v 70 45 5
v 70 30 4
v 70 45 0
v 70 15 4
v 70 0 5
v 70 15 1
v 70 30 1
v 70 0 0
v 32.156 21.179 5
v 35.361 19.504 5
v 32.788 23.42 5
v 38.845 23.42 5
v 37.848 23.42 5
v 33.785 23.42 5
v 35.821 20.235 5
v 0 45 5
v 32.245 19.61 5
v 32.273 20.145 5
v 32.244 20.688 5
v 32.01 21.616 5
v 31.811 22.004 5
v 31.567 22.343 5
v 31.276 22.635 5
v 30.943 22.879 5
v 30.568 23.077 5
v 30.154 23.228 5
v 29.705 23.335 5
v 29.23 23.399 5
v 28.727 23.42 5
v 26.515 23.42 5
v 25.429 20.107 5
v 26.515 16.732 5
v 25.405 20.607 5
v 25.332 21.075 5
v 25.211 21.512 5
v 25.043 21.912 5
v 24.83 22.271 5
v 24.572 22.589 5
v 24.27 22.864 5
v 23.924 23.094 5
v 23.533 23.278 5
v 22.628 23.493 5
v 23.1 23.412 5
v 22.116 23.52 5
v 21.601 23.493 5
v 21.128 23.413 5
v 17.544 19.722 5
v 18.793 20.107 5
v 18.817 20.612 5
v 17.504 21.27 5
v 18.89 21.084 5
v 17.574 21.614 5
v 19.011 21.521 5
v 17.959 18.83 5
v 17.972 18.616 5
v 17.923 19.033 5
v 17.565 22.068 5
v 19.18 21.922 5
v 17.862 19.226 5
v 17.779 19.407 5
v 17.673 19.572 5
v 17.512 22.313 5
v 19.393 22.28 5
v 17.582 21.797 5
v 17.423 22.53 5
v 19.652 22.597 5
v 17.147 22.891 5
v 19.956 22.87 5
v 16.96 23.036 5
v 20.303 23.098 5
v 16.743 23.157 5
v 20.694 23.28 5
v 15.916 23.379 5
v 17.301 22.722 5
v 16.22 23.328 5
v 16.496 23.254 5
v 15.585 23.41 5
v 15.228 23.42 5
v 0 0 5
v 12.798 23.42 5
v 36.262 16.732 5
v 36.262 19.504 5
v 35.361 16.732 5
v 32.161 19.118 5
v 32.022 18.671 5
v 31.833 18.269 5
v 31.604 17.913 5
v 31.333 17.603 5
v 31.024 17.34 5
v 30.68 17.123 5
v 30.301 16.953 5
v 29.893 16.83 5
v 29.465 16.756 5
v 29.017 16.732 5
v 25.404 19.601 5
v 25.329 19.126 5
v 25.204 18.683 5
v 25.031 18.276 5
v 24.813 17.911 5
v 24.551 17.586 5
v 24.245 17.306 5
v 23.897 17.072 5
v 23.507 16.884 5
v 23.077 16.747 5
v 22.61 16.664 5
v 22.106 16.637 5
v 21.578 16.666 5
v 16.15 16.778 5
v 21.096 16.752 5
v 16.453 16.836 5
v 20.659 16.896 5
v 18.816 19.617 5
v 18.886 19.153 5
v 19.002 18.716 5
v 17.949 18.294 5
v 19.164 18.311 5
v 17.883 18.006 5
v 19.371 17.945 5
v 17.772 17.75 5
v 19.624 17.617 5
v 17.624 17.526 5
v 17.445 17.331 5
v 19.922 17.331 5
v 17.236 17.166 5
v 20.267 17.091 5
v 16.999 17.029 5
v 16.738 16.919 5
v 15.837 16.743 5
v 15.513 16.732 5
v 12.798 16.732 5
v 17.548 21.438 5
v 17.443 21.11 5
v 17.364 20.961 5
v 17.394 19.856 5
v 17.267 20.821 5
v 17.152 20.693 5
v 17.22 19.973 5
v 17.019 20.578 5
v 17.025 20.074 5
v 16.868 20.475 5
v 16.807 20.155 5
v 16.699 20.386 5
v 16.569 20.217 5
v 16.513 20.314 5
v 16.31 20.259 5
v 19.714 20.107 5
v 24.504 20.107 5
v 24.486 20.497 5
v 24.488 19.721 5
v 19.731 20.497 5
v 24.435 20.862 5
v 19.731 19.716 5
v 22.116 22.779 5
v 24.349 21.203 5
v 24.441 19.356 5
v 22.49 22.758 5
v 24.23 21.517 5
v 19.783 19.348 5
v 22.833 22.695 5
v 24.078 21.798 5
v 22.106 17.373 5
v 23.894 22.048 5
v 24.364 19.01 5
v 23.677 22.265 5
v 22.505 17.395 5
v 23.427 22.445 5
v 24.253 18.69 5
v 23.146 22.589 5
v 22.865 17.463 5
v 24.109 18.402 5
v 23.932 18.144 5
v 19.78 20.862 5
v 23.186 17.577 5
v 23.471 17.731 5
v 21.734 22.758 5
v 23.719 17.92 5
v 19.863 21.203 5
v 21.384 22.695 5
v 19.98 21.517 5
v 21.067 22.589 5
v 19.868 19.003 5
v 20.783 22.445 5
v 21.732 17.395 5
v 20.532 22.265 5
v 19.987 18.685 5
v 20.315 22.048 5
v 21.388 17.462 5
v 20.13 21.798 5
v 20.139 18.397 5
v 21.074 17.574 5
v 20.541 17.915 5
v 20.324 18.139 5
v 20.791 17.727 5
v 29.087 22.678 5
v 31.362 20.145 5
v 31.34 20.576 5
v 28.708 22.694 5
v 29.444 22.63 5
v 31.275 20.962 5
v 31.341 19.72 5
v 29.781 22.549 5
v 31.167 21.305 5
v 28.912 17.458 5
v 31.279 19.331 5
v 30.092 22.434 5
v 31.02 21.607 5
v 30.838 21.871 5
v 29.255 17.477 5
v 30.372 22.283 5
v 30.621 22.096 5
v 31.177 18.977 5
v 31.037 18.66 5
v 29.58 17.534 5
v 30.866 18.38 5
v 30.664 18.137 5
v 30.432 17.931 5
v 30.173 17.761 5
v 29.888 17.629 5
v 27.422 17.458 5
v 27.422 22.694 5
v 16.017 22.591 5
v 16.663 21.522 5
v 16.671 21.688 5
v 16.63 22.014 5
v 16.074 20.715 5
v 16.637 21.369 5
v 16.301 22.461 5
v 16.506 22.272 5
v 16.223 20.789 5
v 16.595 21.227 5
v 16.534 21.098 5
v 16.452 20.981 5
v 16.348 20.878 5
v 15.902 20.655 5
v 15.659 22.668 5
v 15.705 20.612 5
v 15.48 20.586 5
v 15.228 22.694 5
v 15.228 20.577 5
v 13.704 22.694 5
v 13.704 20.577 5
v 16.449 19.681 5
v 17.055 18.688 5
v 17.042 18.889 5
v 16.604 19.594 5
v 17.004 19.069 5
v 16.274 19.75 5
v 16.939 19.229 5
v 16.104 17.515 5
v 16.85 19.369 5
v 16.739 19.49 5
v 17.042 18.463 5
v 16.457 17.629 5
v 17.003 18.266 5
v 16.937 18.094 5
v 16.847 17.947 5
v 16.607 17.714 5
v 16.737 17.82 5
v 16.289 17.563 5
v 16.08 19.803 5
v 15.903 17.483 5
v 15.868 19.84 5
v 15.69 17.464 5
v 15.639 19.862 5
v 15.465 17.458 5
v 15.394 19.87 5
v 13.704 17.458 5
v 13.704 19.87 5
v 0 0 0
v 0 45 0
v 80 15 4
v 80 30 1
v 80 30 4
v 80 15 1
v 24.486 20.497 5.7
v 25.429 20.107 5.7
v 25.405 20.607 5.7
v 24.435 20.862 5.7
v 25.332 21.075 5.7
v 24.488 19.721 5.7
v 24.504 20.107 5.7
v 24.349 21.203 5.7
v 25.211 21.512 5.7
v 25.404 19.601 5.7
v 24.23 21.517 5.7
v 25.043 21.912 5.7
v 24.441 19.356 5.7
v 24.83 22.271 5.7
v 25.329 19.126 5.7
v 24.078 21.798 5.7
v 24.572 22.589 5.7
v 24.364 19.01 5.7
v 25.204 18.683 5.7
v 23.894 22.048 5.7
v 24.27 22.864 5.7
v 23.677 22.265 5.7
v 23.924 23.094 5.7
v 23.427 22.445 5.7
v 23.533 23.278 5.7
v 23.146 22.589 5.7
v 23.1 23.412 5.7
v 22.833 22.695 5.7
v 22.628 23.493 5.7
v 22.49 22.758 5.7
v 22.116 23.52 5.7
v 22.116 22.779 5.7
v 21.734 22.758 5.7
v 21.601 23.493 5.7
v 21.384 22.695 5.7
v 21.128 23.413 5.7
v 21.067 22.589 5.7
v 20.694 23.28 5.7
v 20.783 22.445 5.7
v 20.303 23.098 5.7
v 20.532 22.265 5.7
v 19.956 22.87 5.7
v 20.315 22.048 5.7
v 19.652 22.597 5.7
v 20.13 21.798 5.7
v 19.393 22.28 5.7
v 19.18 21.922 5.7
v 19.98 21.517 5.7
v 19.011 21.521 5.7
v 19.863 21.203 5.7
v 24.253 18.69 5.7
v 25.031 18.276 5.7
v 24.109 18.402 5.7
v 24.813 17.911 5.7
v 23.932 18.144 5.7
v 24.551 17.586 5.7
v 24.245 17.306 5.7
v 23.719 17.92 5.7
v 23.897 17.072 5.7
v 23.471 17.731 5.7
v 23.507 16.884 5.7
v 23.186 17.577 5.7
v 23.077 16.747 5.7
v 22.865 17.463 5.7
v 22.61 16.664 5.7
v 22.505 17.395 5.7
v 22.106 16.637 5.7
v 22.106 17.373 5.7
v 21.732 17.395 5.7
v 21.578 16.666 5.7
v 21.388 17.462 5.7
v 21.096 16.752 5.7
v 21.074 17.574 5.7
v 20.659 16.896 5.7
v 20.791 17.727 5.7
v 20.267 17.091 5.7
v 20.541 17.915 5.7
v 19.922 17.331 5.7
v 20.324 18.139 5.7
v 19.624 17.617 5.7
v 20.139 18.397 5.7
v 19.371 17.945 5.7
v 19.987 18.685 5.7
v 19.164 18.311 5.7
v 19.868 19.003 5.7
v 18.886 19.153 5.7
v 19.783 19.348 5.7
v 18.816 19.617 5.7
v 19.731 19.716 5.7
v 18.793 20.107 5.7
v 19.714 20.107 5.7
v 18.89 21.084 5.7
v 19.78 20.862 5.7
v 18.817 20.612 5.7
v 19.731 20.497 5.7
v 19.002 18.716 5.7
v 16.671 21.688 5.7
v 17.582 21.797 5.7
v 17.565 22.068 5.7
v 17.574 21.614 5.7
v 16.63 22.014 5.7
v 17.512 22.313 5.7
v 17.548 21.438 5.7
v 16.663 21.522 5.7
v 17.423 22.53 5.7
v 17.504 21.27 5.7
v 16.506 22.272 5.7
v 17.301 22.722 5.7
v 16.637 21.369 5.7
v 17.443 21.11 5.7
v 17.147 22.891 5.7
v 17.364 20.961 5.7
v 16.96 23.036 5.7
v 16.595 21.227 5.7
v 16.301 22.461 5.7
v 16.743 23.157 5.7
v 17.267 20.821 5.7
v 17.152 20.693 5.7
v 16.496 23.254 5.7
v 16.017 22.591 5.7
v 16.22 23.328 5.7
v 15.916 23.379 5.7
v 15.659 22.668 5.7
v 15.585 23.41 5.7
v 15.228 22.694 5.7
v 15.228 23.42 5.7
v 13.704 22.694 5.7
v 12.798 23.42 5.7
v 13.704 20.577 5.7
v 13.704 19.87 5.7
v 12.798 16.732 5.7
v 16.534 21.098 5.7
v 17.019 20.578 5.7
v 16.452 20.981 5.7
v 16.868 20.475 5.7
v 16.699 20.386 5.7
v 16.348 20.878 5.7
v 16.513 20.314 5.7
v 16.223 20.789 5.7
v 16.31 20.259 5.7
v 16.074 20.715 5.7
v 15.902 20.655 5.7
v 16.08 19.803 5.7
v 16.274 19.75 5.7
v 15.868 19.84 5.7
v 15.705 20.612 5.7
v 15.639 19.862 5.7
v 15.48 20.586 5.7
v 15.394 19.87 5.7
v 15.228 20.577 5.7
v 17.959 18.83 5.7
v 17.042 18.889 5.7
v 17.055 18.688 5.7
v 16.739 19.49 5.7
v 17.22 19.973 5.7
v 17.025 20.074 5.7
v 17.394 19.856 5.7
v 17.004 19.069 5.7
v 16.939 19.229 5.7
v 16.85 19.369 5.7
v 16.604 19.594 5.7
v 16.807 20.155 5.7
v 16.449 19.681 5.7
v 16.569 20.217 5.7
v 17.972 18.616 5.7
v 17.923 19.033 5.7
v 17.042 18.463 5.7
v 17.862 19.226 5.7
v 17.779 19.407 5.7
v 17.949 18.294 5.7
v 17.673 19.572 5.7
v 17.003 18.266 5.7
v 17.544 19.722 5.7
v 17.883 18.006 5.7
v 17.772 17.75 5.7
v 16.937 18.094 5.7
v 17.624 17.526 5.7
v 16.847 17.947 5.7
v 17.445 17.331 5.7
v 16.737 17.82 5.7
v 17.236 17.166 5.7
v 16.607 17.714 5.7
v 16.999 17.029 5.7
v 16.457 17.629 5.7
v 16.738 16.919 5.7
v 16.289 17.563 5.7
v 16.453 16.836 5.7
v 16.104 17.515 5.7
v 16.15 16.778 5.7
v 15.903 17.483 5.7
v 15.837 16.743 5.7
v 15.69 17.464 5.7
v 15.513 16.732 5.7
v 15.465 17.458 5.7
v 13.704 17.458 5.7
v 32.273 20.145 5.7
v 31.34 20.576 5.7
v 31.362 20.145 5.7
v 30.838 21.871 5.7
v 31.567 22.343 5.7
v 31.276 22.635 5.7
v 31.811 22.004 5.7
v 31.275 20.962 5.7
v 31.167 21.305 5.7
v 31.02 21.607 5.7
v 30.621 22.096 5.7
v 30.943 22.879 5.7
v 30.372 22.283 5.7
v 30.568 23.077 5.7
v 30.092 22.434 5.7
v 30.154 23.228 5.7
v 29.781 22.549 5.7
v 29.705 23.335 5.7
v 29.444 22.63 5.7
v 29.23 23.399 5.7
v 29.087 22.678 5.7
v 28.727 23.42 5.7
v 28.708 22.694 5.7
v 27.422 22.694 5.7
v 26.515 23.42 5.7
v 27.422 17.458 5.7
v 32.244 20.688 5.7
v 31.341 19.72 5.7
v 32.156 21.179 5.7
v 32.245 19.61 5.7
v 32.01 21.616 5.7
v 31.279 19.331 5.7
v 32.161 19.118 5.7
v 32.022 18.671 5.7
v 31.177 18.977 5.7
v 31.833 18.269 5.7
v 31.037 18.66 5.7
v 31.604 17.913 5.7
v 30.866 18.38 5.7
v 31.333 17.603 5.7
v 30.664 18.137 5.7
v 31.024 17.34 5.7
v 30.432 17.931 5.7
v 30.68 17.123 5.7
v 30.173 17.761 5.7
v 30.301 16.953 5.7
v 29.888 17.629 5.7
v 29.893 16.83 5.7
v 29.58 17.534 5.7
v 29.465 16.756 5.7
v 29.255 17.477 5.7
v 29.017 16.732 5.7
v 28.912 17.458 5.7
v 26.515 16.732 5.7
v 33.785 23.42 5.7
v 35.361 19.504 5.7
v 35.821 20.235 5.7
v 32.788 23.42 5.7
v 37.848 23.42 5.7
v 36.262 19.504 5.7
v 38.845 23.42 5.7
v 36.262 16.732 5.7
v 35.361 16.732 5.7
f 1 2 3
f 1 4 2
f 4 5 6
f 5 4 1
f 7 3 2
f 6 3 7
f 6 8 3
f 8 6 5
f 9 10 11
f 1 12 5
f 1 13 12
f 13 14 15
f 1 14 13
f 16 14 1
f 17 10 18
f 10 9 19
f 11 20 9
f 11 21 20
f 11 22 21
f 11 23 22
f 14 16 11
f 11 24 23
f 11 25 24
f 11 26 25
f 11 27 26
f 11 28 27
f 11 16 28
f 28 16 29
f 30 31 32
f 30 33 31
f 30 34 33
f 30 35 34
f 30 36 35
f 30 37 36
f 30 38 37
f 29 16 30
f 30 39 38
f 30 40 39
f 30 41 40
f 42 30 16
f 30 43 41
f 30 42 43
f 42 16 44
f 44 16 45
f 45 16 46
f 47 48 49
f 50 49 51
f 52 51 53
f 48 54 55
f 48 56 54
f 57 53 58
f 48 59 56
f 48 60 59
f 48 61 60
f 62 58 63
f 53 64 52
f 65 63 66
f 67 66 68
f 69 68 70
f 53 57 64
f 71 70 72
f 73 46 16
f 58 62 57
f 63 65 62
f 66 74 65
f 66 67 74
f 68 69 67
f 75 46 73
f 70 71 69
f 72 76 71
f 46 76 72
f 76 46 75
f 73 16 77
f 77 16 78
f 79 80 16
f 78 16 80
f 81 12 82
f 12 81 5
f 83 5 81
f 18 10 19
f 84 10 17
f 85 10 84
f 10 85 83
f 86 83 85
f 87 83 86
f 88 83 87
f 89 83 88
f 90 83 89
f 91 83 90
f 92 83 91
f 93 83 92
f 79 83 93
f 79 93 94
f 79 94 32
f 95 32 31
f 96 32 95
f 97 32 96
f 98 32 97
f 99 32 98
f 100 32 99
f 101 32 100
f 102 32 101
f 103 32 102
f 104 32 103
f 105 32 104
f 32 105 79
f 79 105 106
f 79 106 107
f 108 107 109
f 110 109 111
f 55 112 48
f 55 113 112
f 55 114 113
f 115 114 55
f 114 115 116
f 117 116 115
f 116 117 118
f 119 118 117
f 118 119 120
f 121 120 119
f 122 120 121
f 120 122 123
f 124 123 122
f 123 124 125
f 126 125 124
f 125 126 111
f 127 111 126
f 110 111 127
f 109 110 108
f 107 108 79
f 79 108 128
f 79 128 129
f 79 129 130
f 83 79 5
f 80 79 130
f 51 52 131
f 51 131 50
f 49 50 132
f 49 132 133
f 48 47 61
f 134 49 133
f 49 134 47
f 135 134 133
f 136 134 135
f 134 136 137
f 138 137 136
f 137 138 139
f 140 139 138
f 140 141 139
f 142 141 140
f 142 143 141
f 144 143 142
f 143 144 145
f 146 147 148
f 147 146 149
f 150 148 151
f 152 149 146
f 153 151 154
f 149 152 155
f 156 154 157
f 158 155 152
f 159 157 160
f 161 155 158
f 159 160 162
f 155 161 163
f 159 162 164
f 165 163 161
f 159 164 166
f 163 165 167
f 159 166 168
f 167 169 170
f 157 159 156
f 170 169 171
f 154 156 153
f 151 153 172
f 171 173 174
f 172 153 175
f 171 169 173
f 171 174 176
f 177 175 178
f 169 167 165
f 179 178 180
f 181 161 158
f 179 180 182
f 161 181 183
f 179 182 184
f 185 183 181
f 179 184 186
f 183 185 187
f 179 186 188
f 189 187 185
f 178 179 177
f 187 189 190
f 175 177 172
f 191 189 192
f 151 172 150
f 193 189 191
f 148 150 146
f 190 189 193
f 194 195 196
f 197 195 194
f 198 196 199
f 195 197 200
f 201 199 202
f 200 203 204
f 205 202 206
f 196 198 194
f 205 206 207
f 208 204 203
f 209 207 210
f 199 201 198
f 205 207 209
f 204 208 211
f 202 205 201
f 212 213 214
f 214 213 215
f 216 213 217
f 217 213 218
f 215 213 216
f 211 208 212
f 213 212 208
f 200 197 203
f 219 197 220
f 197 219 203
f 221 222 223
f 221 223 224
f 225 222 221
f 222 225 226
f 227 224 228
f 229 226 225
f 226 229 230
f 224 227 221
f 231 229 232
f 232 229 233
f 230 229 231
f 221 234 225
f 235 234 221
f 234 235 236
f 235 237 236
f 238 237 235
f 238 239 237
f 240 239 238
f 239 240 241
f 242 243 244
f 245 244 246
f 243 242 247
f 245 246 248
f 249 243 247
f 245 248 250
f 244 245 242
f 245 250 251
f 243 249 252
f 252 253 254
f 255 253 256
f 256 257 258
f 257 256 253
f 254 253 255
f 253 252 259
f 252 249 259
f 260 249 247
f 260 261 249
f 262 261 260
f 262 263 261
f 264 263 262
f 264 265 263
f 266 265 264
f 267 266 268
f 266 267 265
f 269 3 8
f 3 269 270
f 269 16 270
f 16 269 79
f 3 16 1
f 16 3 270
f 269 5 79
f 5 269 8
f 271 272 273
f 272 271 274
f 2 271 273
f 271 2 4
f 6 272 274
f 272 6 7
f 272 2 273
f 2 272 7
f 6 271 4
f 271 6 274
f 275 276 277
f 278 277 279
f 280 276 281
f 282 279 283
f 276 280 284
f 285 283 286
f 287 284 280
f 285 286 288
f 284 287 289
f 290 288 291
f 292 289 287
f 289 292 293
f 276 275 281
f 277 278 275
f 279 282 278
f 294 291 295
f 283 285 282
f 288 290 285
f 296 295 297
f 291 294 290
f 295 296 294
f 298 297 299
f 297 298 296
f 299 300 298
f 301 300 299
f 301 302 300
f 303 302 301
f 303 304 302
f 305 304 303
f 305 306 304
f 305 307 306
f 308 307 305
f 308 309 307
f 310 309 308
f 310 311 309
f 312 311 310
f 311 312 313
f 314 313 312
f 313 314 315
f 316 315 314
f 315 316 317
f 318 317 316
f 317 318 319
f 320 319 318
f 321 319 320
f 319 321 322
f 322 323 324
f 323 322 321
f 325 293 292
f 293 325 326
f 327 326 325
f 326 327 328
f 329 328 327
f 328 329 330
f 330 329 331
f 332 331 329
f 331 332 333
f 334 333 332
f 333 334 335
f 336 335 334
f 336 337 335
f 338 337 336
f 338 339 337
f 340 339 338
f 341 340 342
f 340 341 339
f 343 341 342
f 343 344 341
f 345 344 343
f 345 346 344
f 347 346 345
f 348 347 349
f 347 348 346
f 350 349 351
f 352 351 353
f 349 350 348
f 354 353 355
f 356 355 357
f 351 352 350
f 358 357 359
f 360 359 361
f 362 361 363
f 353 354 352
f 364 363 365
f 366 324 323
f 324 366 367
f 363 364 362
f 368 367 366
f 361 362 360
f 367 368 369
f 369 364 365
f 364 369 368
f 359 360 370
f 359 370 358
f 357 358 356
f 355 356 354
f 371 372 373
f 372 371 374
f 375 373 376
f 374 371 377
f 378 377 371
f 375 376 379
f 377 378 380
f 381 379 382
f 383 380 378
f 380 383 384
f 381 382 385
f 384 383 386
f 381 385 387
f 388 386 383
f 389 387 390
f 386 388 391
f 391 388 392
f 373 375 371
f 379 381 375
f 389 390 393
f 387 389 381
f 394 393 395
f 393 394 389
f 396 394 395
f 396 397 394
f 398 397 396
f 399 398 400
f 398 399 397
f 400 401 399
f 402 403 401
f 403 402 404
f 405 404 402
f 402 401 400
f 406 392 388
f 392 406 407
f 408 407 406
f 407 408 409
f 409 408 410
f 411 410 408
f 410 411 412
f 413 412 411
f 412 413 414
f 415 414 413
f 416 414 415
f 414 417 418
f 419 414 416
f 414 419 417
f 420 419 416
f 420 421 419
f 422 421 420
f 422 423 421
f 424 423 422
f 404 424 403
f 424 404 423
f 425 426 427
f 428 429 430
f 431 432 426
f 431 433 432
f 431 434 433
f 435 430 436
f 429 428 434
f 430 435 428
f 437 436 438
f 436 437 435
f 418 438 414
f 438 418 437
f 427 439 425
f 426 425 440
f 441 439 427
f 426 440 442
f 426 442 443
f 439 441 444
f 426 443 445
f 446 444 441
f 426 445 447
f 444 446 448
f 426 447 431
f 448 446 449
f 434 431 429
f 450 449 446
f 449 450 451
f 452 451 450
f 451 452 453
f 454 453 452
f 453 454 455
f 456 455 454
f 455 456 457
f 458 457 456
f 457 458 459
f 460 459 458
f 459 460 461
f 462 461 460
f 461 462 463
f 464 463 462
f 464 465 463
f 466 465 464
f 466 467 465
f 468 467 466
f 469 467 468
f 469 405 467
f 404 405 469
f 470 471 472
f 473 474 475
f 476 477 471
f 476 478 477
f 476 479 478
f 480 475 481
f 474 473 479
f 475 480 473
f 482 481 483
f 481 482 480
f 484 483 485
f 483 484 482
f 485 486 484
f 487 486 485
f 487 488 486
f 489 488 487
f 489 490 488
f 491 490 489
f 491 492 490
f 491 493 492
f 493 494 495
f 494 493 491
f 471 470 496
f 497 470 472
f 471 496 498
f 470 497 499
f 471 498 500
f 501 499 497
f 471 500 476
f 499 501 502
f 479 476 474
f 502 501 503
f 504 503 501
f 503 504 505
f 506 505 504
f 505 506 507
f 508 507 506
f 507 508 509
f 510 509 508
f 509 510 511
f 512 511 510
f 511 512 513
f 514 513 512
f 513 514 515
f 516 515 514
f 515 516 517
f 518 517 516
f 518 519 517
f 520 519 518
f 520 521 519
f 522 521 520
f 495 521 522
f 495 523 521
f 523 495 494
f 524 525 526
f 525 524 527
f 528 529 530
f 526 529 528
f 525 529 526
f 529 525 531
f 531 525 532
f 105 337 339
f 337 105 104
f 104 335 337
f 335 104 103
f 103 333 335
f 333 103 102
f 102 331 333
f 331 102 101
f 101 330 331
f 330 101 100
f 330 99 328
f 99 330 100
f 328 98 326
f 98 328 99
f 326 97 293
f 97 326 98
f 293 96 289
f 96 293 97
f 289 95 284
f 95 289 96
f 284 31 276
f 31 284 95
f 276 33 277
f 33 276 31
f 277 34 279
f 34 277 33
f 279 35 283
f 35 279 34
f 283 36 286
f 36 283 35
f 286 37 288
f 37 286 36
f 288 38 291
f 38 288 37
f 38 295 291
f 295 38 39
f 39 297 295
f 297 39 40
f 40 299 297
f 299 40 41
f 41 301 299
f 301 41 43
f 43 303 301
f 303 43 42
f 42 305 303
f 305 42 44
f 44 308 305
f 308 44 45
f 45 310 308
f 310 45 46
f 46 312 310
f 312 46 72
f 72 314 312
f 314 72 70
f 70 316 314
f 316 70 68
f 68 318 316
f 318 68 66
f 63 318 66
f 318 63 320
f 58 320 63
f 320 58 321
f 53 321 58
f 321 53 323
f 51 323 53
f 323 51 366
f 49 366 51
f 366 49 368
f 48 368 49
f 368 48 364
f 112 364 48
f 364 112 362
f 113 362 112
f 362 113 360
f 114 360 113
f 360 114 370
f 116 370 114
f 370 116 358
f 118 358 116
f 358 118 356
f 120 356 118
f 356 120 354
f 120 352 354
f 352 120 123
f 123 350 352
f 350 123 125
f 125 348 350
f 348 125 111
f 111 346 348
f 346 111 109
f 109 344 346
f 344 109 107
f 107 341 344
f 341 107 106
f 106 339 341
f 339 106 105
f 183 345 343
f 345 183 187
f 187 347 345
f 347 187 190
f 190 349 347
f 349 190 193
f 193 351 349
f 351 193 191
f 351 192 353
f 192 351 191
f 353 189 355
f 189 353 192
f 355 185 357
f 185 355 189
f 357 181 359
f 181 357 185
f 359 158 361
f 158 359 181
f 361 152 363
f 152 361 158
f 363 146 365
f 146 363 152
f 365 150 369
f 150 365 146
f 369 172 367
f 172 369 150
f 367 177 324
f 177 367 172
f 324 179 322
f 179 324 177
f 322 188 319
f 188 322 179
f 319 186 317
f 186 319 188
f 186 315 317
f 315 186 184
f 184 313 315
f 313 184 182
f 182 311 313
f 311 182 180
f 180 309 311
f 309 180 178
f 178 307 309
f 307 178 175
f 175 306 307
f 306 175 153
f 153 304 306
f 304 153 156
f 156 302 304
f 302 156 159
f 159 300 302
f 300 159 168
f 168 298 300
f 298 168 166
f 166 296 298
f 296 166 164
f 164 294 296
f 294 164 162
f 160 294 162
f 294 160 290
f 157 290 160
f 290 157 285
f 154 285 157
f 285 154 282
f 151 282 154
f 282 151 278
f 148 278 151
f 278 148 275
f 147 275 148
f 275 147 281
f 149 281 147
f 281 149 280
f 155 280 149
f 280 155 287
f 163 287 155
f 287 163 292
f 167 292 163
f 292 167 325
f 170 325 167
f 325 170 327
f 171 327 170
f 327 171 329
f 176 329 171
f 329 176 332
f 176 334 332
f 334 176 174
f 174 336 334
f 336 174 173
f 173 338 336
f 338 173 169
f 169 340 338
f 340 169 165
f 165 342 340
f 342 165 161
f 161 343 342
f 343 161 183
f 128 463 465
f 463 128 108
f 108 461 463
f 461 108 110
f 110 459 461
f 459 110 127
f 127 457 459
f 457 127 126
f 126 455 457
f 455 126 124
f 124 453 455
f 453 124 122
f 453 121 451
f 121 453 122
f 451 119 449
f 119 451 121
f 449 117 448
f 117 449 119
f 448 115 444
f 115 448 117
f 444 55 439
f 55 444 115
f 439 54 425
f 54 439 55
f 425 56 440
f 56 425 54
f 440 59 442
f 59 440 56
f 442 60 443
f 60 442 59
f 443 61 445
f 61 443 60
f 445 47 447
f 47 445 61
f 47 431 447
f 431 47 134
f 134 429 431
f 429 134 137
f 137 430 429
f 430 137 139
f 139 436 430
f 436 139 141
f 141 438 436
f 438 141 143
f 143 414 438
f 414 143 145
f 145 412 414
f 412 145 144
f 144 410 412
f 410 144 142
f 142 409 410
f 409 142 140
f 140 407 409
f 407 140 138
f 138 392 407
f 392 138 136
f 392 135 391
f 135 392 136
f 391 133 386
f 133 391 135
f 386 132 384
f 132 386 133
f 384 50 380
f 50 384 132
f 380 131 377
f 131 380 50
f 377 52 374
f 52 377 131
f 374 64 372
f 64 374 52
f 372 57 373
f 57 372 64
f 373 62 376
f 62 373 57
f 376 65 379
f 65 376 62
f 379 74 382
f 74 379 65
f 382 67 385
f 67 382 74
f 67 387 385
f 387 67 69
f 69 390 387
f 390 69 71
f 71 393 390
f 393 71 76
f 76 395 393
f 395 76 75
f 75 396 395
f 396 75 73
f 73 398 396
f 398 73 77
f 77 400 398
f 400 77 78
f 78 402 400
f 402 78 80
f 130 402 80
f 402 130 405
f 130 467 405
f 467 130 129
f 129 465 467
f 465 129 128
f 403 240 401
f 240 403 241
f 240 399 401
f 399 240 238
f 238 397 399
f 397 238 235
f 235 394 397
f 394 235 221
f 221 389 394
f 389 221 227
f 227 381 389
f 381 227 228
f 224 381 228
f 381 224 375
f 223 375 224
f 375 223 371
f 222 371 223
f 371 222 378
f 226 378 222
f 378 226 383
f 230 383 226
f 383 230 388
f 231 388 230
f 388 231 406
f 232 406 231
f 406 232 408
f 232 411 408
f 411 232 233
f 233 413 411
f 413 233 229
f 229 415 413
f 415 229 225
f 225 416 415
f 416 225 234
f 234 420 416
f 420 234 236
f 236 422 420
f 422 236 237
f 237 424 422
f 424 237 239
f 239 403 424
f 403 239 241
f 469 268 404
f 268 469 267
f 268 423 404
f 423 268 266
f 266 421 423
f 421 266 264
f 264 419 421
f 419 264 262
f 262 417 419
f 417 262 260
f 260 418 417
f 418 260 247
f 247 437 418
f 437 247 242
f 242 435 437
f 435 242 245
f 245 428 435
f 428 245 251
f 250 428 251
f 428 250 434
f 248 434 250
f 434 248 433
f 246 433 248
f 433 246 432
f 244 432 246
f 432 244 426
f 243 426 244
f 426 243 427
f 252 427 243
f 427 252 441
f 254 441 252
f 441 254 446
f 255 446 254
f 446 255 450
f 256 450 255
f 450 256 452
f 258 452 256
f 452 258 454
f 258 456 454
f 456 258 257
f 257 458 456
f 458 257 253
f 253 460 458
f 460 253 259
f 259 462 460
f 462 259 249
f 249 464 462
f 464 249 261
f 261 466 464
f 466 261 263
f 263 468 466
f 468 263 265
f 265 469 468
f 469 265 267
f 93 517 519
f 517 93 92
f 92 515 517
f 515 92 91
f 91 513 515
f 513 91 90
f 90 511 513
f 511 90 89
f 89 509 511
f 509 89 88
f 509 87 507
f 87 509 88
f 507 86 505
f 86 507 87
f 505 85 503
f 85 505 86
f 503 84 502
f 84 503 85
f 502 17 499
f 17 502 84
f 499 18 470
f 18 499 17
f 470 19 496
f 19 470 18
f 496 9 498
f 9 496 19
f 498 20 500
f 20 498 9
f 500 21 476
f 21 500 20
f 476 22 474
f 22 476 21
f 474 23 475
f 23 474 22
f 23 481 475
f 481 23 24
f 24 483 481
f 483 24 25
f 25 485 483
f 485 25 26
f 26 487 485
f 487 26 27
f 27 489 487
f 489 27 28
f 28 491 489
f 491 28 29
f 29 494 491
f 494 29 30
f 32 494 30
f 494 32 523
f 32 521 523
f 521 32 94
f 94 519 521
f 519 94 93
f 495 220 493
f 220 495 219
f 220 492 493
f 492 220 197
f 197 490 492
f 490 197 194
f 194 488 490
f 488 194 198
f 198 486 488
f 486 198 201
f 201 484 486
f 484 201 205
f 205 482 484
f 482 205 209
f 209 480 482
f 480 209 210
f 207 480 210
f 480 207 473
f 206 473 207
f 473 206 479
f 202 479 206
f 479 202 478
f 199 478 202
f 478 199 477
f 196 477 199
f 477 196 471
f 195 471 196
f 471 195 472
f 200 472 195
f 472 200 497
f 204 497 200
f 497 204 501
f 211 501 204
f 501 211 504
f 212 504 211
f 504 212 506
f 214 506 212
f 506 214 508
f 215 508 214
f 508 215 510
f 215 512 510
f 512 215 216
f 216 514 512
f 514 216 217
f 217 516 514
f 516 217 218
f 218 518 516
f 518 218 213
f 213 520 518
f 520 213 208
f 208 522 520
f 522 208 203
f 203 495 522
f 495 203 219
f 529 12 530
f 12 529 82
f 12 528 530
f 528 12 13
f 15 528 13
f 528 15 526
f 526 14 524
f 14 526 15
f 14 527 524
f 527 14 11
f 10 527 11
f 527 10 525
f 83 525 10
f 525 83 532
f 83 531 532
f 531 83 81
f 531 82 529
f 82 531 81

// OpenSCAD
// Nathan Tabor five nonfunctional educational connection tiles.
// All measurements nominal millimeters. Test joint tolerance on actual material.
// Print individually: openscad -o matrix_1.stl -D 'TILE=0' five_into_one.scad
// TILE index: 0=BODY 1=SOUL 2=SHADOW 3=MIND 4=SPIRIT
TILE=0;
tile_w=70;
tile_h=45;
tile_z=5;
tongue_depth=10;
tongue_width=15;
tongue_z=3;
clearance=0.35;
labels=["BODY","SOUL","SHADOW","MIND","SPIRIT"];
assert(TILE>=0 && TILE<=4);

module base_part(i){
  difference(){
    union(){
      cube([tile_w,tile_h,tile_z],center=false);
      if(i<4)
        translate([tile_w,15,tile_z/2-tongue_z/2])
          cube([tongue_depth,tongue_width,tongue_z]);
    }
    if(i>0)
      translate([-0.05,15-clearance/2,tile_z/2-tongue_z/2-clearance/2])
        cube([tongue_depth+clearance,tongue_width+clearance,tongue_z+clearance]);
  }
}
module one_tile(i){
  union(){
    base_part(i);
    translate([12,20,tile_z])
      linear_extrude(height=0.7)
      text(labels[i],size=7,halign="left",valign="center");
    if(i==2)
      translate([24,8,tile_z])
        linear_extrude(height=0.7)
        text("ONE",size=5.5);
  }
}
one_tile(TILE);
